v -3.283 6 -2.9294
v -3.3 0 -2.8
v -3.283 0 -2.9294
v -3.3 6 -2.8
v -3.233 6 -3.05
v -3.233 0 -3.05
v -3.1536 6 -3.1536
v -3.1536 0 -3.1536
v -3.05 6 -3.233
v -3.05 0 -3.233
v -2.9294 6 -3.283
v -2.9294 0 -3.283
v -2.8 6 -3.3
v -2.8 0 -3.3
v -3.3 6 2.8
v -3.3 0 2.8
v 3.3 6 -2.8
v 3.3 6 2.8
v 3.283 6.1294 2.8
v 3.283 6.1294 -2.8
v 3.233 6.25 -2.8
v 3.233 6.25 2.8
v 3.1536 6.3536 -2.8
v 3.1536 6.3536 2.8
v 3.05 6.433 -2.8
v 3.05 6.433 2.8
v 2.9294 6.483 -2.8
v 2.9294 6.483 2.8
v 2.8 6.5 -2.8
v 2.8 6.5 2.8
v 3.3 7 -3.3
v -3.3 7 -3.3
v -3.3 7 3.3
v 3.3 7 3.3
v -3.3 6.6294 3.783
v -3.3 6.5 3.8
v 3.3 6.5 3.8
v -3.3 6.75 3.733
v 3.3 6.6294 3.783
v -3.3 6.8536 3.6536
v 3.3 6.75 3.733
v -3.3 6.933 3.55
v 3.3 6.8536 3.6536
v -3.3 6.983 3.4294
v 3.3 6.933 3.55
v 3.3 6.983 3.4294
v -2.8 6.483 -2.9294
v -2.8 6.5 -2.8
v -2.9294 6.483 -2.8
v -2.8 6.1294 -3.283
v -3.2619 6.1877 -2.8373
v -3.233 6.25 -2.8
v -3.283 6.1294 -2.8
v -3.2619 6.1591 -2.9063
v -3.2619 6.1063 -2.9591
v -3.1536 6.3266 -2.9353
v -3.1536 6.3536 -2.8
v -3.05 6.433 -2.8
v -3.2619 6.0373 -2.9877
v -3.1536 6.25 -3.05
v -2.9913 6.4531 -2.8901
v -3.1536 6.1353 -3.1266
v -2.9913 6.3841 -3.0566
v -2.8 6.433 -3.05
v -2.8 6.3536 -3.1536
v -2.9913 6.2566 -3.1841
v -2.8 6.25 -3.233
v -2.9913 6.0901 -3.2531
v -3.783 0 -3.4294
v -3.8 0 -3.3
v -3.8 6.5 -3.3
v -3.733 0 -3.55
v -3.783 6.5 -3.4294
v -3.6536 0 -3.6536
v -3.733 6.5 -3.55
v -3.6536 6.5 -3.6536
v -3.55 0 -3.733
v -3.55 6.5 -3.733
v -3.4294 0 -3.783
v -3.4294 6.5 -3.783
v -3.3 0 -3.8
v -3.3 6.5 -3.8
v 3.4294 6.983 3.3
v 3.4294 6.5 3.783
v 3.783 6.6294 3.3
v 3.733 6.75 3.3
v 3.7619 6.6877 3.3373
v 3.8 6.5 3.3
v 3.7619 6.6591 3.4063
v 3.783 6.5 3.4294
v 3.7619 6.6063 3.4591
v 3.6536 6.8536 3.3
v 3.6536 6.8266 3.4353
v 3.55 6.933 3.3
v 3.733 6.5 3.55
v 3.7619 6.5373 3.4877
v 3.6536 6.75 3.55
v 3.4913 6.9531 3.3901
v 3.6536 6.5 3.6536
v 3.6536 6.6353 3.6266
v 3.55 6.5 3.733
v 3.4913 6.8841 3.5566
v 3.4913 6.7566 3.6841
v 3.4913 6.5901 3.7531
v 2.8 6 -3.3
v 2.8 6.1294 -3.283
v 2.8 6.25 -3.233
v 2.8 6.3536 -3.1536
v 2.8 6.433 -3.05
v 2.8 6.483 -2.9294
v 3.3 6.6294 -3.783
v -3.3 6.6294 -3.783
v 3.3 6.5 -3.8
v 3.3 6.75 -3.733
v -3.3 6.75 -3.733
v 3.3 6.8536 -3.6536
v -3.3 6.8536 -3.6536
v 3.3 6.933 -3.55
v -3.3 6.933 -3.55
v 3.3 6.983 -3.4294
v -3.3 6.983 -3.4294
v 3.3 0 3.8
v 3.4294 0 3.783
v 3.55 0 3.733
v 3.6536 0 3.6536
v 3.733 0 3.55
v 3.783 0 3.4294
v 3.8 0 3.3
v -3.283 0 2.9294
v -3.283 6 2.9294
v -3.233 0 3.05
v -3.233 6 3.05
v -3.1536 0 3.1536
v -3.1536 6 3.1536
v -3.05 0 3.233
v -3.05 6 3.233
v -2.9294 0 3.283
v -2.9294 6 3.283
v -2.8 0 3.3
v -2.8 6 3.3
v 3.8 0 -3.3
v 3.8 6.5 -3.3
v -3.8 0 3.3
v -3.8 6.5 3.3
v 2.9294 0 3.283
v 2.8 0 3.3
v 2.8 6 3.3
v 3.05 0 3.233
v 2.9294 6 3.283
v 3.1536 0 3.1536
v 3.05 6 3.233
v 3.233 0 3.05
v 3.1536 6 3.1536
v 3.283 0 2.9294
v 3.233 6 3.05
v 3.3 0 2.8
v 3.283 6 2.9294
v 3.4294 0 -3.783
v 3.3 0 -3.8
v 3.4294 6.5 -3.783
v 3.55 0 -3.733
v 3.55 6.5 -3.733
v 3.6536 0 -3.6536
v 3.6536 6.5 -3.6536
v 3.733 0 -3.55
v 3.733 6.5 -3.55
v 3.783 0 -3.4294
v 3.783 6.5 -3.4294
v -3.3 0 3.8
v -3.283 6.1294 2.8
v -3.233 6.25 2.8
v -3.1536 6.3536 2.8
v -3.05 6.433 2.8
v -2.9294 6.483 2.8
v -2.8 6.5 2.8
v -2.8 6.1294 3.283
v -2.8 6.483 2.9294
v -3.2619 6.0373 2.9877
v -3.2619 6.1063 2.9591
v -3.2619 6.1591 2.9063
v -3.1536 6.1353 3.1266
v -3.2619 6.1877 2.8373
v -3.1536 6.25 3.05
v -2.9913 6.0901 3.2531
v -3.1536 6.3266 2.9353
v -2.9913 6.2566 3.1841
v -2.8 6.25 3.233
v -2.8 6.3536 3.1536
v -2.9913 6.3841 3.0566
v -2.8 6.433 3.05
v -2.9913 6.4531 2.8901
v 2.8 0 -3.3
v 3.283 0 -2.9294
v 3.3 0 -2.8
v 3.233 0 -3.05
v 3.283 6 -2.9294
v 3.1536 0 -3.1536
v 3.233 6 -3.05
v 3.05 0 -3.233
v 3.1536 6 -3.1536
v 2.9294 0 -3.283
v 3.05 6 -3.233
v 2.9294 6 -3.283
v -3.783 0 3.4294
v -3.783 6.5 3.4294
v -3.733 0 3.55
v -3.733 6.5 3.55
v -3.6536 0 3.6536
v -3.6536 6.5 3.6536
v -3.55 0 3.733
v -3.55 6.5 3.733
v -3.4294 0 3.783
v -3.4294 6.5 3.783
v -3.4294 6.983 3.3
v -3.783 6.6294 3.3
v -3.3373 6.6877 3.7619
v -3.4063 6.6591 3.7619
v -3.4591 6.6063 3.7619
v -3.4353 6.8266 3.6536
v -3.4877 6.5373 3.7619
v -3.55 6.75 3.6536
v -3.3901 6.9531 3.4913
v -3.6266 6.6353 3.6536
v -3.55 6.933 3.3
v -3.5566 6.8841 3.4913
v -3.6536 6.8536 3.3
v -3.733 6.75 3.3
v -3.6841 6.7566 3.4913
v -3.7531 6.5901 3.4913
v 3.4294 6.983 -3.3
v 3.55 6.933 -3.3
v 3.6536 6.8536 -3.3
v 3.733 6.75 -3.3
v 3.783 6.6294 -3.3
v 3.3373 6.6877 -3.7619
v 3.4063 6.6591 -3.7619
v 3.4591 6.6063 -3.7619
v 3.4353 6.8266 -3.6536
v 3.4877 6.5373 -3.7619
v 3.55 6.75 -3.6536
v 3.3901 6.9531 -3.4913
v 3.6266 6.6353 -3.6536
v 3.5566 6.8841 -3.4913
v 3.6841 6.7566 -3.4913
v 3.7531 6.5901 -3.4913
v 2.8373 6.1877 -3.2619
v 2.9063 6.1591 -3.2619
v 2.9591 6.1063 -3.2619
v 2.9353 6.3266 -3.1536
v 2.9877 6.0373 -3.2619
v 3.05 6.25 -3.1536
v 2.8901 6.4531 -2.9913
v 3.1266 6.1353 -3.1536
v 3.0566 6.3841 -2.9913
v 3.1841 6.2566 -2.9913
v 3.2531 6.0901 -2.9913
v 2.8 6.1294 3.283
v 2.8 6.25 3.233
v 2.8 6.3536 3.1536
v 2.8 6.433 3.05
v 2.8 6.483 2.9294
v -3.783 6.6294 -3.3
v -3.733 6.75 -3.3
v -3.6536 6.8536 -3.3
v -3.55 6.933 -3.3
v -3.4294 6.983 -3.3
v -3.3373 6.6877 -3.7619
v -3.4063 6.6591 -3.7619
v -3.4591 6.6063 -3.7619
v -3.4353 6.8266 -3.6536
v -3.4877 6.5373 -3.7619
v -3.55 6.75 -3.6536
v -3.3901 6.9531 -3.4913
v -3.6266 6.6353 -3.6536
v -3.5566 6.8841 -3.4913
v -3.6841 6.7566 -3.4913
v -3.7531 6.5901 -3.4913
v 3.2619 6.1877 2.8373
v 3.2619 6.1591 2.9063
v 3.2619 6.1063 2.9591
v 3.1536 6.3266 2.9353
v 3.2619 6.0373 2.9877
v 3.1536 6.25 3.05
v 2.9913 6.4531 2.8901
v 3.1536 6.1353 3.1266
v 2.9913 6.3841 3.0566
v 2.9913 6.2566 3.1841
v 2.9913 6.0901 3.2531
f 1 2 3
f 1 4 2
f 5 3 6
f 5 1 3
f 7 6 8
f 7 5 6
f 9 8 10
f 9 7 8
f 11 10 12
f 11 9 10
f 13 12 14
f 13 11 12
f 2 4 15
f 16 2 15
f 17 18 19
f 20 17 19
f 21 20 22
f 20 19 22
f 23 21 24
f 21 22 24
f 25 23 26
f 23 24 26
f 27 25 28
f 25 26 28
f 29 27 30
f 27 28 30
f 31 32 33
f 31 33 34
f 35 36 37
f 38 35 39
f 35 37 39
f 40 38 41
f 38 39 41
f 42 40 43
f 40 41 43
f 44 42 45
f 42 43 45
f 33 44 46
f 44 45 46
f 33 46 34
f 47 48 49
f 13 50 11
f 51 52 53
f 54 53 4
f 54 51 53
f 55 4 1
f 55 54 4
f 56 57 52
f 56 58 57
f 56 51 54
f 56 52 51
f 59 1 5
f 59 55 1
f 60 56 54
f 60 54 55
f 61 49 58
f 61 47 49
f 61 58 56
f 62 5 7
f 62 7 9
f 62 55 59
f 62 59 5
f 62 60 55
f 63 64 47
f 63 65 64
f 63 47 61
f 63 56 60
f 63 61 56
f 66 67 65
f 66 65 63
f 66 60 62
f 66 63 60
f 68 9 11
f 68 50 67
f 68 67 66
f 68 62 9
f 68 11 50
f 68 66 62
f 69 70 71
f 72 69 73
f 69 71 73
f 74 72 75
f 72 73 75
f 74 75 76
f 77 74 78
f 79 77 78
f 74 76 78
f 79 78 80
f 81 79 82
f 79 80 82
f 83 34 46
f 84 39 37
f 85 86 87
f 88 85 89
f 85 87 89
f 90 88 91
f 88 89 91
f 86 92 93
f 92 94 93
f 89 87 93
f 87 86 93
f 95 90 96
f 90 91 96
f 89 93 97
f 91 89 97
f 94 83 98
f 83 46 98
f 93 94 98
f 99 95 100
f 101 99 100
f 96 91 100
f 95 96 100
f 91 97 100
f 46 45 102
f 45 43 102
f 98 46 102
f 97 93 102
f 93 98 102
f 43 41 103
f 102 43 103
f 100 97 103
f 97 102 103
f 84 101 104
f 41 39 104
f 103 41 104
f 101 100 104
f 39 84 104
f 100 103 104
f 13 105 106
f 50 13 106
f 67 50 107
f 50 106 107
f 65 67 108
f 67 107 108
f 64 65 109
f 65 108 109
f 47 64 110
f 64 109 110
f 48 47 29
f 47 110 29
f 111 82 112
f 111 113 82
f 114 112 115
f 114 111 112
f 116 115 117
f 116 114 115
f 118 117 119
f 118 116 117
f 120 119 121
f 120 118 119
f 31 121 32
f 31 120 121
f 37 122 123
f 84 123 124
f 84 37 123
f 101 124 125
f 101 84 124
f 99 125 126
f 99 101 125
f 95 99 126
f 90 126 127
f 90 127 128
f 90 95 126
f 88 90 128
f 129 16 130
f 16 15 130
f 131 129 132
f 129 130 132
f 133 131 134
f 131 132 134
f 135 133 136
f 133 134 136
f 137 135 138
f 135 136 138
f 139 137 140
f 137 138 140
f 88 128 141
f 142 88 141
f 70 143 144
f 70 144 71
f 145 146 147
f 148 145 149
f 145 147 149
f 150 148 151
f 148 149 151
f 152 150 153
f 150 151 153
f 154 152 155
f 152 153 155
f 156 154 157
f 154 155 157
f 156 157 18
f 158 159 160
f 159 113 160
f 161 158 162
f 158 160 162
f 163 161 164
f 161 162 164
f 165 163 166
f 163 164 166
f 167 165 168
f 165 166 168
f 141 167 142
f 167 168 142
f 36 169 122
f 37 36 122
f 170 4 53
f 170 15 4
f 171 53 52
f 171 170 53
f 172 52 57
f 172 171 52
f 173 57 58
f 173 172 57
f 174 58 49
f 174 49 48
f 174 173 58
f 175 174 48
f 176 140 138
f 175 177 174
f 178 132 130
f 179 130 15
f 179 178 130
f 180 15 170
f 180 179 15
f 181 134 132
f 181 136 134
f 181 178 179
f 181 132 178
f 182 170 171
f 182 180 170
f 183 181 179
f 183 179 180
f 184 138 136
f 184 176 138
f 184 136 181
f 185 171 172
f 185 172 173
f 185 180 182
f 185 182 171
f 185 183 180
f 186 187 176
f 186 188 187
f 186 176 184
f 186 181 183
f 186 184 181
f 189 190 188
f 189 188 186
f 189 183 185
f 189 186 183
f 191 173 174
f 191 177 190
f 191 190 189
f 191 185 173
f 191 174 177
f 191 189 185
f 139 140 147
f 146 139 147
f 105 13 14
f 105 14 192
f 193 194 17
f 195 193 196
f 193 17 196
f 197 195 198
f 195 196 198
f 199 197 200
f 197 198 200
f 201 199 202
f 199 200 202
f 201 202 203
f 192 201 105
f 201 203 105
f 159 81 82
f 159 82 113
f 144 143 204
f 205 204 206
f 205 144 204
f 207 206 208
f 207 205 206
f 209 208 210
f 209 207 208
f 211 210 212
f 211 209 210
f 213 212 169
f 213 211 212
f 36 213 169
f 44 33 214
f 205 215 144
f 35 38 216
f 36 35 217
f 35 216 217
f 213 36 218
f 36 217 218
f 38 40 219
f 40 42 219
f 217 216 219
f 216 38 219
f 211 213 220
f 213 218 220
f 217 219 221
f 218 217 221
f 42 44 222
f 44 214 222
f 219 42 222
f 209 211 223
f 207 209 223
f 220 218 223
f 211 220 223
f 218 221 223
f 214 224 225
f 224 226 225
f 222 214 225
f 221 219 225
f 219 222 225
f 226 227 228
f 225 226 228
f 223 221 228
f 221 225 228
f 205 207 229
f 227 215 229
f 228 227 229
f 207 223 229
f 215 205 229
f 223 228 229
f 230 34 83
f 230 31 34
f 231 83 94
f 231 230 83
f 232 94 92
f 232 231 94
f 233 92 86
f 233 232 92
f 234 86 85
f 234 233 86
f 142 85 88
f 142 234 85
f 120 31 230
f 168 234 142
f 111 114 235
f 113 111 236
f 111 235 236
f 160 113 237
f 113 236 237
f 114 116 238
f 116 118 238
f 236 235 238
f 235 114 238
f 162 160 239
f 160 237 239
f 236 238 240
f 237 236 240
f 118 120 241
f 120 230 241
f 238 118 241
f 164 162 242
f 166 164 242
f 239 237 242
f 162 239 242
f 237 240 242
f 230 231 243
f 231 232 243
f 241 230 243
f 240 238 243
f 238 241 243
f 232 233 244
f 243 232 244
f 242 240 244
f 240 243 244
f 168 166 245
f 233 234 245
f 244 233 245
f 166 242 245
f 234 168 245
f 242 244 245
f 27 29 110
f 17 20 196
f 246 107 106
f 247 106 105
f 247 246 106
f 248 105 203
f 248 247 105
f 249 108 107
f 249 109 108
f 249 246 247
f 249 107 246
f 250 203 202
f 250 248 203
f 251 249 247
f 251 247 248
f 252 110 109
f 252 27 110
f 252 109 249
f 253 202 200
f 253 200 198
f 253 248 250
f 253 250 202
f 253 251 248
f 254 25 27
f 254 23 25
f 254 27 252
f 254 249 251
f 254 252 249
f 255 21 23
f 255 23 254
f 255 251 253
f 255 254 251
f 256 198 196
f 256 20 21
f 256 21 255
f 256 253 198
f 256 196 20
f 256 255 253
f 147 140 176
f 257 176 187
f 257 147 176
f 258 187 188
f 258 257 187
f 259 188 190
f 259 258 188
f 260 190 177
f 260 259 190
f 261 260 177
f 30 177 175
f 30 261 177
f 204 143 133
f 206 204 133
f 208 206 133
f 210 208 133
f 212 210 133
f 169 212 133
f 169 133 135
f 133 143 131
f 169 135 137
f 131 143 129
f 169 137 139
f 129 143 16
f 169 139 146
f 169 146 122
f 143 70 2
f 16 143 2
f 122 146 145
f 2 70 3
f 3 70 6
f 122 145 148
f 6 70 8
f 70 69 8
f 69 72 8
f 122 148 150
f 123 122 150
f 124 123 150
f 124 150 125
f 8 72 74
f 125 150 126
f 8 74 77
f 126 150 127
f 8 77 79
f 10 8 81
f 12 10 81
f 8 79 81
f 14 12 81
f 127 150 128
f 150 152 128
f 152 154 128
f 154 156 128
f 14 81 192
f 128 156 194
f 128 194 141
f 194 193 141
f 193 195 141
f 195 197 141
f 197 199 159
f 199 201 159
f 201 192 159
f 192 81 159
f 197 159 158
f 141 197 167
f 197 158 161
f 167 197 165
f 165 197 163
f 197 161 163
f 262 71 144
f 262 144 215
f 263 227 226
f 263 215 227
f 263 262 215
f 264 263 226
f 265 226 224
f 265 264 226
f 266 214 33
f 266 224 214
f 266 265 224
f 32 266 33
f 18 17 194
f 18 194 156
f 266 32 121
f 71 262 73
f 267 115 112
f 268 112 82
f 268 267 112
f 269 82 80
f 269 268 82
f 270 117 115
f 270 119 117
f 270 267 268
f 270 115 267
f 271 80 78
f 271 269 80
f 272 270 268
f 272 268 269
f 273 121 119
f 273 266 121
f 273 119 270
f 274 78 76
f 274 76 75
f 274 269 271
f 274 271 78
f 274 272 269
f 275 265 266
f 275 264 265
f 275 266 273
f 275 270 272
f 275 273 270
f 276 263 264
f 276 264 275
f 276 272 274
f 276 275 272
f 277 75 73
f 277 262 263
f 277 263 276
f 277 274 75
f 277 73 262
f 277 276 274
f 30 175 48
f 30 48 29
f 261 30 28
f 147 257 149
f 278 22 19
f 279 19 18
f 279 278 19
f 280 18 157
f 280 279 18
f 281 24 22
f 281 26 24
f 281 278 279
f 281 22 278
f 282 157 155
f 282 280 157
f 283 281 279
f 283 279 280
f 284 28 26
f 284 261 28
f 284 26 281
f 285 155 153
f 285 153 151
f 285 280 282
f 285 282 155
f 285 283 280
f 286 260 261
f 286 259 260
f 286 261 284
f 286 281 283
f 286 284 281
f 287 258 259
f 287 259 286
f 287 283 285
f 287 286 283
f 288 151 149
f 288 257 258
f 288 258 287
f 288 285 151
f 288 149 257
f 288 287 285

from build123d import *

# Parameters (mm, degrees)
SKETCH1_W           = 7.6
SKETCH1_H           = 7.6
BOSS_EXTRUDE1_DEPTH = 7
SKETCH2_W           = 6.6
SKETCH2_H           = 6.6
CUT_EXTRUDE1_DEPTH  = 6.5
FILLET2_R           = 0.5


with BuildPart() as part:
    # Sketch1 → Boss-Extrude1 (new body)
    with BuildSketch(Plane(origin=(0, 0, 0), x_dir=(1, 0, 0), z_dir=(0, 1, 0))):
        Rectangle(SKETCH1_W, SKETCH1_H)
    extrude(amount=BOSS_EXTRUDE1_DEPTH)

    # Sketch2 → Cut-Extrude1 (cut)
    with BuildSketch(Plane.XZ):
        Rectangle(SKETCH2_W, SKETCH2_H)
    extrude(amount=-CUT_EXTRUDE1_DEPTH, mode=Mode.SUBTRACT)

    # Fillet2
    fillet2_edges = [part.edges().sort_by_distance(p)[0] for p in [
        (-3.8, 7, 0),
        (0, 7, 3.8),
        (0, 6.5, 3.3),
        (-3.3, 3.25, 3.3),
        (3.3, 6.5, 0),
        (3.3, 3.25, 3.3),
        (0, 6.5, -3.3),
        (3.3, 3.25, -3.3),
        (-3.3, 6.5, 0),
        (-3.3, 3.25, -3.3),
        (3.8, 7, 0),
        (0, 7, -3.8),
        (3.8, 3.5, 3.8),
        (-3.8, 3.5, 3.8),
        (-3.8, 3.5, -3.8),
        (3.8, 3.5, -3.8),
    ]]
    fillet(fillet2_edges, radius=FILLET2_R)


solid = part.part
